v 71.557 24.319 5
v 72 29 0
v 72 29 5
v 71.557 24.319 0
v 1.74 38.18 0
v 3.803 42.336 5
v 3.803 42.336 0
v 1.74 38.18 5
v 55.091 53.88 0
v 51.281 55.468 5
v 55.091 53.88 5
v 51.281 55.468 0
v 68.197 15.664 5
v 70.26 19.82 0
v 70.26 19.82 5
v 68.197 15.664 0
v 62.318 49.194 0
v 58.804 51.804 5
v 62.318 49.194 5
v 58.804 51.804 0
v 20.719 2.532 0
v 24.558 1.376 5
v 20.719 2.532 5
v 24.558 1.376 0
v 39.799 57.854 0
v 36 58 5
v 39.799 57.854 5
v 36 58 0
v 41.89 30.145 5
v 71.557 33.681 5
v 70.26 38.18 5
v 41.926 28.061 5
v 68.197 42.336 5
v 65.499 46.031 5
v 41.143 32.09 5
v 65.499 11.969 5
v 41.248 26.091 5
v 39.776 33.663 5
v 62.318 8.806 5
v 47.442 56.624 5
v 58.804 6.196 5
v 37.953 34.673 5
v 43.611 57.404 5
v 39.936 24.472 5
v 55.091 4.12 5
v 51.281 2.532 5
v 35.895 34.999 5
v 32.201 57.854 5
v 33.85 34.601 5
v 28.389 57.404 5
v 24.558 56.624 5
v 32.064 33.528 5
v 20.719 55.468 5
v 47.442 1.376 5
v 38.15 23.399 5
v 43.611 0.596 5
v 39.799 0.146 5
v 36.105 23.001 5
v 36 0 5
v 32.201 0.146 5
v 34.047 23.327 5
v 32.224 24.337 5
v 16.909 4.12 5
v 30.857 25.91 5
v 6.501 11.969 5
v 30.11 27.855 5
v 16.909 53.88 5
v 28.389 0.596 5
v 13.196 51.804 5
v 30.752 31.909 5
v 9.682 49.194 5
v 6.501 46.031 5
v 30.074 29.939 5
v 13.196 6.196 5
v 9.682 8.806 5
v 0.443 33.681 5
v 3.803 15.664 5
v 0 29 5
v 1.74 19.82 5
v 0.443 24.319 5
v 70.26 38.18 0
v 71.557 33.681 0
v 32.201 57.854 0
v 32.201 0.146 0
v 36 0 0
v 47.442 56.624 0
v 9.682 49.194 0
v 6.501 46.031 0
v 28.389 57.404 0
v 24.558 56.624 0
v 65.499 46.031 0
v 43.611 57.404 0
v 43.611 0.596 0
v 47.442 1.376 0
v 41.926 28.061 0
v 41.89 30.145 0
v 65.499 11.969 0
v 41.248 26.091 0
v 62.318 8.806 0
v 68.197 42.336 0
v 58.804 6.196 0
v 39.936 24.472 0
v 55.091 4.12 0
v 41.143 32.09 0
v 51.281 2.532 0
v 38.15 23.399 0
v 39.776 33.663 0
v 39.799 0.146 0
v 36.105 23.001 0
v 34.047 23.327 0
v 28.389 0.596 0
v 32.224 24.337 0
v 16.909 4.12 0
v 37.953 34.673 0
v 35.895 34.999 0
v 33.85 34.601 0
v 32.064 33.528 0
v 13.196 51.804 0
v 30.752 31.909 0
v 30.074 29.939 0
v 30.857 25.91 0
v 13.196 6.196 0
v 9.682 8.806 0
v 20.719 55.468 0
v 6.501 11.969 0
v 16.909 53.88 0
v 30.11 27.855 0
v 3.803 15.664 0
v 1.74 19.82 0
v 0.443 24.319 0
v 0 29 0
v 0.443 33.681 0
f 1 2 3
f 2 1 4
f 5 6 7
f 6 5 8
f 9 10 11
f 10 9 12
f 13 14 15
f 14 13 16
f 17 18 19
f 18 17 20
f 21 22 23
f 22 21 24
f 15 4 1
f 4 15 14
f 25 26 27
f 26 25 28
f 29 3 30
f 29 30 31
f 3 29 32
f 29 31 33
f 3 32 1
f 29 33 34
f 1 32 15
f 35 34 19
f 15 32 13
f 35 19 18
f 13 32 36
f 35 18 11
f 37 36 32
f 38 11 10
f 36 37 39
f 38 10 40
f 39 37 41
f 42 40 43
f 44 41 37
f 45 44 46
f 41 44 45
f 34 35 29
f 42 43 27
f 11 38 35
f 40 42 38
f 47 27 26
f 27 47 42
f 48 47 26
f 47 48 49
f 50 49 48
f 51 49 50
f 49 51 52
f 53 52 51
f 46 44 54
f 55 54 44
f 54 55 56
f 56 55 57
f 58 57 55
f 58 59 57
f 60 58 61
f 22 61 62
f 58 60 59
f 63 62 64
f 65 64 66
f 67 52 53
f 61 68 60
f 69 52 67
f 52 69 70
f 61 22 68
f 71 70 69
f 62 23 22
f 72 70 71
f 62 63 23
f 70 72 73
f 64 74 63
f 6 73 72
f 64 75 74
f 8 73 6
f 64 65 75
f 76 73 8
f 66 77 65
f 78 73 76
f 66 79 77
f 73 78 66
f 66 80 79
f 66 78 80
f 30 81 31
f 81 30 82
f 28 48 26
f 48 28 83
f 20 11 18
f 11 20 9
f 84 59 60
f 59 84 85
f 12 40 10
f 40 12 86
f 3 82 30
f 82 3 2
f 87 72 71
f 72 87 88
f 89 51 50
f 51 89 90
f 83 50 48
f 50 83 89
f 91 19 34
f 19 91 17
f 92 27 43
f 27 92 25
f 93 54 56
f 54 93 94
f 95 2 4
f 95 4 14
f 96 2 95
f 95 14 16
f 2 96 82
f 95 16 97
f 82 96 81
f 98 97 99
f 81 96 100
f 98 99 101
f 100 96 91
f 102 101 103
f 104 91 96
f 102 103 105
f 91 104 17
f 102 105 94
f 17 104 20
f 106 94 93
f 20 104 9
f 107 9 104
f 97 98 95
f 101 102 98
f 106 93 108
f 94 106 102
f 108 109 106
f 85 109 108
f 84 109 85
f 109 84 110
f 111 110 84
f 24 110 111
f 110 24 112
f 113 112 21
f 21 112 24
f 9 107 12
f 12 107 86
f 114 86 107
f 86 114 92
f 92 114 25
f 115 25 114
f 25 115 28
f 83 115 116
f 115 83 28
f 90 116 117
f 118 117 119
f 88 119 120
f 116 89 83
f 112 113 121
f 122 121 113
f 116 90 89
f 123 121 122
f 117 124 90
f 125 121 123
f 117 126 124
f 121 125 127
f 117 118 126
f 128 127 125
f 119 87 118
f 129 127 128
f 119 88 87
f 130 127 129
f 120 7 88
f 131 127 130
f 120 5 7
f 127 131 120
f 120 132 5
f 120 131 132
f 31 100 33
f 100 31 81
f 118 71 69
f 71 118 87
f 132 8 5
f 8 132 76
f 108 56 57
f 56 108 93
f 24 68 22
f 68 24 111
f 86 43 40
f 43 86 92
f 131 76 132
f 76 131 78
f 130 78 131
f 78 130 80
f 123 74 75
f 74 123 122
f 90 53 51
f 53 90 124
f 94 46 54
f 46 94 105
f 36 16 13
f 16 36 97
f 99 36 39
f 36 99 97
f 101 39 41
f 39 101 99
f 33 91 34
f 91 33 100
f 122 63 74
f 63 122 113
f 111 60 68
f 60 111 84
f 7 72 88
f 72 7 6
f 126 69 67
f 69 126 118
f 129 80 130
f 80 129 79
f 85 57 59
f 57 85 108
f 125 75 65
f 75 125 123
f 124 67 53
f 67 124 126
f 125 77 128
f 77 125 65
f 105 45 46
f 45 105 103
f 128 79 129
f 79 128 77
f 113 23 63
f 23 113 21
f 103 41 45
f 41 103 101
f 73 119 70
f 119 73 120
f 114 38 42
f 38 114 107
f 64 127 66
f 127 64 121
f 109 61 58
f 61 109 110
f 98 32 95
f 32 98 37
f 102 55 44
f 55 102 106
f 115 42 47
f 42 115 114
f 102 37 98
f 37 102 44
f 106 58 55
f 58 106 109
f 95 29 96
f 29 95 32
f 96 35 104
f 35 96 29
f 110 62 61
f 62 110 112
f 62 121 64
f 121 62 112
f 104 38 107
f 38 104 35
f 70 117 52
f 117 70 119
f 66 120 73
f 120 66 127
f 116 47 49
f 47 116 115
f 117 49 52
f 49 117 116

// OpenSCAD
$fn = 32;

// ----------------------------------------------------------------------
// Cam plate: double_lobe cam, base R28
// ----------------------------------------------------------------------

// --- parameters (mm) ---
base_r = 28;              // base circle radius
lobe_h = 8;               // cam lobe rise
bore_r = 6;               // shaft bore radius
plate_t = 5;              // plate thickness, Z (extrusion height)
fit_tol = 0.02;           // declared fit tolerance (prompt contract)
free_tol = 0.2;           // declared free tolerance (prompt contract)

profile = [[72, 29], [71.557, 33.681], [70.26, 38.18], [68.197, 42.336], [65.499, 46.031], [62.318, 49.194], [58.804, 51.804], [55.091, 53.88], [51.281, 55.468], [47.442, 56.624], [43.611, 57.404], [39.799, 57.854], [36, 58], [32.201, 57.854], [28.389, 57.404], [24.558, 56.624], [20.719, 55.468], [16.909, 53.88], [13.196, 51.804], [9.682, 49.194], [6.501, 46.031], [3.803, 42.336], [1.74, 38.18], [0.443, 33.681], [0, 29], [0.443, 24.319], [1.74, 19.82], [3.803, 15.664], [6.501, 11.969], [9.682, 8.806], [13.196, 6.196], [16.909, 4.12], [20.719, 2.532], [24.558, 1.376], [28.389, 0.596], [32.201, 0.146], [36, 0], [39.799, 0.146], [43.611, 0.596], [47.442, 1.376], [51.281, 2.532], [55.091, 4.12], [58.804, 6.196], [62.318, 8.806], [65.499, 11.969], [68.197, 15.664], [70.26, 19.82], [71.557, 24.319]];  // primary outline, 48 points, counter clockwise
void_1 = [[41.89, 30.145], [41.143, 32.09], [39.776, 33.663], [37.953, 34.673], [35.895, 34.999], [33.85, 34.601], [32.064, 33.528], [30.752, 31.909], [30.074, 29.939], [30.11, 27.855], [30.857, 25.91], [32.224, 24.337], [34.047, 23.327], [36.105, 23.001], [38.15, 23.399], [39.936, 24.472], [41.248, 26.091], [41.926, 28.061]];  // shaft bore, 18 points

// --- the one profile operation ---
difference() {
  linear_extrude(height = plate_t) polygon(points = profile);
  translate([0, 0, -1])
    linear_extrude(height = plate_t + 2) polygon(points = void_1);
}
